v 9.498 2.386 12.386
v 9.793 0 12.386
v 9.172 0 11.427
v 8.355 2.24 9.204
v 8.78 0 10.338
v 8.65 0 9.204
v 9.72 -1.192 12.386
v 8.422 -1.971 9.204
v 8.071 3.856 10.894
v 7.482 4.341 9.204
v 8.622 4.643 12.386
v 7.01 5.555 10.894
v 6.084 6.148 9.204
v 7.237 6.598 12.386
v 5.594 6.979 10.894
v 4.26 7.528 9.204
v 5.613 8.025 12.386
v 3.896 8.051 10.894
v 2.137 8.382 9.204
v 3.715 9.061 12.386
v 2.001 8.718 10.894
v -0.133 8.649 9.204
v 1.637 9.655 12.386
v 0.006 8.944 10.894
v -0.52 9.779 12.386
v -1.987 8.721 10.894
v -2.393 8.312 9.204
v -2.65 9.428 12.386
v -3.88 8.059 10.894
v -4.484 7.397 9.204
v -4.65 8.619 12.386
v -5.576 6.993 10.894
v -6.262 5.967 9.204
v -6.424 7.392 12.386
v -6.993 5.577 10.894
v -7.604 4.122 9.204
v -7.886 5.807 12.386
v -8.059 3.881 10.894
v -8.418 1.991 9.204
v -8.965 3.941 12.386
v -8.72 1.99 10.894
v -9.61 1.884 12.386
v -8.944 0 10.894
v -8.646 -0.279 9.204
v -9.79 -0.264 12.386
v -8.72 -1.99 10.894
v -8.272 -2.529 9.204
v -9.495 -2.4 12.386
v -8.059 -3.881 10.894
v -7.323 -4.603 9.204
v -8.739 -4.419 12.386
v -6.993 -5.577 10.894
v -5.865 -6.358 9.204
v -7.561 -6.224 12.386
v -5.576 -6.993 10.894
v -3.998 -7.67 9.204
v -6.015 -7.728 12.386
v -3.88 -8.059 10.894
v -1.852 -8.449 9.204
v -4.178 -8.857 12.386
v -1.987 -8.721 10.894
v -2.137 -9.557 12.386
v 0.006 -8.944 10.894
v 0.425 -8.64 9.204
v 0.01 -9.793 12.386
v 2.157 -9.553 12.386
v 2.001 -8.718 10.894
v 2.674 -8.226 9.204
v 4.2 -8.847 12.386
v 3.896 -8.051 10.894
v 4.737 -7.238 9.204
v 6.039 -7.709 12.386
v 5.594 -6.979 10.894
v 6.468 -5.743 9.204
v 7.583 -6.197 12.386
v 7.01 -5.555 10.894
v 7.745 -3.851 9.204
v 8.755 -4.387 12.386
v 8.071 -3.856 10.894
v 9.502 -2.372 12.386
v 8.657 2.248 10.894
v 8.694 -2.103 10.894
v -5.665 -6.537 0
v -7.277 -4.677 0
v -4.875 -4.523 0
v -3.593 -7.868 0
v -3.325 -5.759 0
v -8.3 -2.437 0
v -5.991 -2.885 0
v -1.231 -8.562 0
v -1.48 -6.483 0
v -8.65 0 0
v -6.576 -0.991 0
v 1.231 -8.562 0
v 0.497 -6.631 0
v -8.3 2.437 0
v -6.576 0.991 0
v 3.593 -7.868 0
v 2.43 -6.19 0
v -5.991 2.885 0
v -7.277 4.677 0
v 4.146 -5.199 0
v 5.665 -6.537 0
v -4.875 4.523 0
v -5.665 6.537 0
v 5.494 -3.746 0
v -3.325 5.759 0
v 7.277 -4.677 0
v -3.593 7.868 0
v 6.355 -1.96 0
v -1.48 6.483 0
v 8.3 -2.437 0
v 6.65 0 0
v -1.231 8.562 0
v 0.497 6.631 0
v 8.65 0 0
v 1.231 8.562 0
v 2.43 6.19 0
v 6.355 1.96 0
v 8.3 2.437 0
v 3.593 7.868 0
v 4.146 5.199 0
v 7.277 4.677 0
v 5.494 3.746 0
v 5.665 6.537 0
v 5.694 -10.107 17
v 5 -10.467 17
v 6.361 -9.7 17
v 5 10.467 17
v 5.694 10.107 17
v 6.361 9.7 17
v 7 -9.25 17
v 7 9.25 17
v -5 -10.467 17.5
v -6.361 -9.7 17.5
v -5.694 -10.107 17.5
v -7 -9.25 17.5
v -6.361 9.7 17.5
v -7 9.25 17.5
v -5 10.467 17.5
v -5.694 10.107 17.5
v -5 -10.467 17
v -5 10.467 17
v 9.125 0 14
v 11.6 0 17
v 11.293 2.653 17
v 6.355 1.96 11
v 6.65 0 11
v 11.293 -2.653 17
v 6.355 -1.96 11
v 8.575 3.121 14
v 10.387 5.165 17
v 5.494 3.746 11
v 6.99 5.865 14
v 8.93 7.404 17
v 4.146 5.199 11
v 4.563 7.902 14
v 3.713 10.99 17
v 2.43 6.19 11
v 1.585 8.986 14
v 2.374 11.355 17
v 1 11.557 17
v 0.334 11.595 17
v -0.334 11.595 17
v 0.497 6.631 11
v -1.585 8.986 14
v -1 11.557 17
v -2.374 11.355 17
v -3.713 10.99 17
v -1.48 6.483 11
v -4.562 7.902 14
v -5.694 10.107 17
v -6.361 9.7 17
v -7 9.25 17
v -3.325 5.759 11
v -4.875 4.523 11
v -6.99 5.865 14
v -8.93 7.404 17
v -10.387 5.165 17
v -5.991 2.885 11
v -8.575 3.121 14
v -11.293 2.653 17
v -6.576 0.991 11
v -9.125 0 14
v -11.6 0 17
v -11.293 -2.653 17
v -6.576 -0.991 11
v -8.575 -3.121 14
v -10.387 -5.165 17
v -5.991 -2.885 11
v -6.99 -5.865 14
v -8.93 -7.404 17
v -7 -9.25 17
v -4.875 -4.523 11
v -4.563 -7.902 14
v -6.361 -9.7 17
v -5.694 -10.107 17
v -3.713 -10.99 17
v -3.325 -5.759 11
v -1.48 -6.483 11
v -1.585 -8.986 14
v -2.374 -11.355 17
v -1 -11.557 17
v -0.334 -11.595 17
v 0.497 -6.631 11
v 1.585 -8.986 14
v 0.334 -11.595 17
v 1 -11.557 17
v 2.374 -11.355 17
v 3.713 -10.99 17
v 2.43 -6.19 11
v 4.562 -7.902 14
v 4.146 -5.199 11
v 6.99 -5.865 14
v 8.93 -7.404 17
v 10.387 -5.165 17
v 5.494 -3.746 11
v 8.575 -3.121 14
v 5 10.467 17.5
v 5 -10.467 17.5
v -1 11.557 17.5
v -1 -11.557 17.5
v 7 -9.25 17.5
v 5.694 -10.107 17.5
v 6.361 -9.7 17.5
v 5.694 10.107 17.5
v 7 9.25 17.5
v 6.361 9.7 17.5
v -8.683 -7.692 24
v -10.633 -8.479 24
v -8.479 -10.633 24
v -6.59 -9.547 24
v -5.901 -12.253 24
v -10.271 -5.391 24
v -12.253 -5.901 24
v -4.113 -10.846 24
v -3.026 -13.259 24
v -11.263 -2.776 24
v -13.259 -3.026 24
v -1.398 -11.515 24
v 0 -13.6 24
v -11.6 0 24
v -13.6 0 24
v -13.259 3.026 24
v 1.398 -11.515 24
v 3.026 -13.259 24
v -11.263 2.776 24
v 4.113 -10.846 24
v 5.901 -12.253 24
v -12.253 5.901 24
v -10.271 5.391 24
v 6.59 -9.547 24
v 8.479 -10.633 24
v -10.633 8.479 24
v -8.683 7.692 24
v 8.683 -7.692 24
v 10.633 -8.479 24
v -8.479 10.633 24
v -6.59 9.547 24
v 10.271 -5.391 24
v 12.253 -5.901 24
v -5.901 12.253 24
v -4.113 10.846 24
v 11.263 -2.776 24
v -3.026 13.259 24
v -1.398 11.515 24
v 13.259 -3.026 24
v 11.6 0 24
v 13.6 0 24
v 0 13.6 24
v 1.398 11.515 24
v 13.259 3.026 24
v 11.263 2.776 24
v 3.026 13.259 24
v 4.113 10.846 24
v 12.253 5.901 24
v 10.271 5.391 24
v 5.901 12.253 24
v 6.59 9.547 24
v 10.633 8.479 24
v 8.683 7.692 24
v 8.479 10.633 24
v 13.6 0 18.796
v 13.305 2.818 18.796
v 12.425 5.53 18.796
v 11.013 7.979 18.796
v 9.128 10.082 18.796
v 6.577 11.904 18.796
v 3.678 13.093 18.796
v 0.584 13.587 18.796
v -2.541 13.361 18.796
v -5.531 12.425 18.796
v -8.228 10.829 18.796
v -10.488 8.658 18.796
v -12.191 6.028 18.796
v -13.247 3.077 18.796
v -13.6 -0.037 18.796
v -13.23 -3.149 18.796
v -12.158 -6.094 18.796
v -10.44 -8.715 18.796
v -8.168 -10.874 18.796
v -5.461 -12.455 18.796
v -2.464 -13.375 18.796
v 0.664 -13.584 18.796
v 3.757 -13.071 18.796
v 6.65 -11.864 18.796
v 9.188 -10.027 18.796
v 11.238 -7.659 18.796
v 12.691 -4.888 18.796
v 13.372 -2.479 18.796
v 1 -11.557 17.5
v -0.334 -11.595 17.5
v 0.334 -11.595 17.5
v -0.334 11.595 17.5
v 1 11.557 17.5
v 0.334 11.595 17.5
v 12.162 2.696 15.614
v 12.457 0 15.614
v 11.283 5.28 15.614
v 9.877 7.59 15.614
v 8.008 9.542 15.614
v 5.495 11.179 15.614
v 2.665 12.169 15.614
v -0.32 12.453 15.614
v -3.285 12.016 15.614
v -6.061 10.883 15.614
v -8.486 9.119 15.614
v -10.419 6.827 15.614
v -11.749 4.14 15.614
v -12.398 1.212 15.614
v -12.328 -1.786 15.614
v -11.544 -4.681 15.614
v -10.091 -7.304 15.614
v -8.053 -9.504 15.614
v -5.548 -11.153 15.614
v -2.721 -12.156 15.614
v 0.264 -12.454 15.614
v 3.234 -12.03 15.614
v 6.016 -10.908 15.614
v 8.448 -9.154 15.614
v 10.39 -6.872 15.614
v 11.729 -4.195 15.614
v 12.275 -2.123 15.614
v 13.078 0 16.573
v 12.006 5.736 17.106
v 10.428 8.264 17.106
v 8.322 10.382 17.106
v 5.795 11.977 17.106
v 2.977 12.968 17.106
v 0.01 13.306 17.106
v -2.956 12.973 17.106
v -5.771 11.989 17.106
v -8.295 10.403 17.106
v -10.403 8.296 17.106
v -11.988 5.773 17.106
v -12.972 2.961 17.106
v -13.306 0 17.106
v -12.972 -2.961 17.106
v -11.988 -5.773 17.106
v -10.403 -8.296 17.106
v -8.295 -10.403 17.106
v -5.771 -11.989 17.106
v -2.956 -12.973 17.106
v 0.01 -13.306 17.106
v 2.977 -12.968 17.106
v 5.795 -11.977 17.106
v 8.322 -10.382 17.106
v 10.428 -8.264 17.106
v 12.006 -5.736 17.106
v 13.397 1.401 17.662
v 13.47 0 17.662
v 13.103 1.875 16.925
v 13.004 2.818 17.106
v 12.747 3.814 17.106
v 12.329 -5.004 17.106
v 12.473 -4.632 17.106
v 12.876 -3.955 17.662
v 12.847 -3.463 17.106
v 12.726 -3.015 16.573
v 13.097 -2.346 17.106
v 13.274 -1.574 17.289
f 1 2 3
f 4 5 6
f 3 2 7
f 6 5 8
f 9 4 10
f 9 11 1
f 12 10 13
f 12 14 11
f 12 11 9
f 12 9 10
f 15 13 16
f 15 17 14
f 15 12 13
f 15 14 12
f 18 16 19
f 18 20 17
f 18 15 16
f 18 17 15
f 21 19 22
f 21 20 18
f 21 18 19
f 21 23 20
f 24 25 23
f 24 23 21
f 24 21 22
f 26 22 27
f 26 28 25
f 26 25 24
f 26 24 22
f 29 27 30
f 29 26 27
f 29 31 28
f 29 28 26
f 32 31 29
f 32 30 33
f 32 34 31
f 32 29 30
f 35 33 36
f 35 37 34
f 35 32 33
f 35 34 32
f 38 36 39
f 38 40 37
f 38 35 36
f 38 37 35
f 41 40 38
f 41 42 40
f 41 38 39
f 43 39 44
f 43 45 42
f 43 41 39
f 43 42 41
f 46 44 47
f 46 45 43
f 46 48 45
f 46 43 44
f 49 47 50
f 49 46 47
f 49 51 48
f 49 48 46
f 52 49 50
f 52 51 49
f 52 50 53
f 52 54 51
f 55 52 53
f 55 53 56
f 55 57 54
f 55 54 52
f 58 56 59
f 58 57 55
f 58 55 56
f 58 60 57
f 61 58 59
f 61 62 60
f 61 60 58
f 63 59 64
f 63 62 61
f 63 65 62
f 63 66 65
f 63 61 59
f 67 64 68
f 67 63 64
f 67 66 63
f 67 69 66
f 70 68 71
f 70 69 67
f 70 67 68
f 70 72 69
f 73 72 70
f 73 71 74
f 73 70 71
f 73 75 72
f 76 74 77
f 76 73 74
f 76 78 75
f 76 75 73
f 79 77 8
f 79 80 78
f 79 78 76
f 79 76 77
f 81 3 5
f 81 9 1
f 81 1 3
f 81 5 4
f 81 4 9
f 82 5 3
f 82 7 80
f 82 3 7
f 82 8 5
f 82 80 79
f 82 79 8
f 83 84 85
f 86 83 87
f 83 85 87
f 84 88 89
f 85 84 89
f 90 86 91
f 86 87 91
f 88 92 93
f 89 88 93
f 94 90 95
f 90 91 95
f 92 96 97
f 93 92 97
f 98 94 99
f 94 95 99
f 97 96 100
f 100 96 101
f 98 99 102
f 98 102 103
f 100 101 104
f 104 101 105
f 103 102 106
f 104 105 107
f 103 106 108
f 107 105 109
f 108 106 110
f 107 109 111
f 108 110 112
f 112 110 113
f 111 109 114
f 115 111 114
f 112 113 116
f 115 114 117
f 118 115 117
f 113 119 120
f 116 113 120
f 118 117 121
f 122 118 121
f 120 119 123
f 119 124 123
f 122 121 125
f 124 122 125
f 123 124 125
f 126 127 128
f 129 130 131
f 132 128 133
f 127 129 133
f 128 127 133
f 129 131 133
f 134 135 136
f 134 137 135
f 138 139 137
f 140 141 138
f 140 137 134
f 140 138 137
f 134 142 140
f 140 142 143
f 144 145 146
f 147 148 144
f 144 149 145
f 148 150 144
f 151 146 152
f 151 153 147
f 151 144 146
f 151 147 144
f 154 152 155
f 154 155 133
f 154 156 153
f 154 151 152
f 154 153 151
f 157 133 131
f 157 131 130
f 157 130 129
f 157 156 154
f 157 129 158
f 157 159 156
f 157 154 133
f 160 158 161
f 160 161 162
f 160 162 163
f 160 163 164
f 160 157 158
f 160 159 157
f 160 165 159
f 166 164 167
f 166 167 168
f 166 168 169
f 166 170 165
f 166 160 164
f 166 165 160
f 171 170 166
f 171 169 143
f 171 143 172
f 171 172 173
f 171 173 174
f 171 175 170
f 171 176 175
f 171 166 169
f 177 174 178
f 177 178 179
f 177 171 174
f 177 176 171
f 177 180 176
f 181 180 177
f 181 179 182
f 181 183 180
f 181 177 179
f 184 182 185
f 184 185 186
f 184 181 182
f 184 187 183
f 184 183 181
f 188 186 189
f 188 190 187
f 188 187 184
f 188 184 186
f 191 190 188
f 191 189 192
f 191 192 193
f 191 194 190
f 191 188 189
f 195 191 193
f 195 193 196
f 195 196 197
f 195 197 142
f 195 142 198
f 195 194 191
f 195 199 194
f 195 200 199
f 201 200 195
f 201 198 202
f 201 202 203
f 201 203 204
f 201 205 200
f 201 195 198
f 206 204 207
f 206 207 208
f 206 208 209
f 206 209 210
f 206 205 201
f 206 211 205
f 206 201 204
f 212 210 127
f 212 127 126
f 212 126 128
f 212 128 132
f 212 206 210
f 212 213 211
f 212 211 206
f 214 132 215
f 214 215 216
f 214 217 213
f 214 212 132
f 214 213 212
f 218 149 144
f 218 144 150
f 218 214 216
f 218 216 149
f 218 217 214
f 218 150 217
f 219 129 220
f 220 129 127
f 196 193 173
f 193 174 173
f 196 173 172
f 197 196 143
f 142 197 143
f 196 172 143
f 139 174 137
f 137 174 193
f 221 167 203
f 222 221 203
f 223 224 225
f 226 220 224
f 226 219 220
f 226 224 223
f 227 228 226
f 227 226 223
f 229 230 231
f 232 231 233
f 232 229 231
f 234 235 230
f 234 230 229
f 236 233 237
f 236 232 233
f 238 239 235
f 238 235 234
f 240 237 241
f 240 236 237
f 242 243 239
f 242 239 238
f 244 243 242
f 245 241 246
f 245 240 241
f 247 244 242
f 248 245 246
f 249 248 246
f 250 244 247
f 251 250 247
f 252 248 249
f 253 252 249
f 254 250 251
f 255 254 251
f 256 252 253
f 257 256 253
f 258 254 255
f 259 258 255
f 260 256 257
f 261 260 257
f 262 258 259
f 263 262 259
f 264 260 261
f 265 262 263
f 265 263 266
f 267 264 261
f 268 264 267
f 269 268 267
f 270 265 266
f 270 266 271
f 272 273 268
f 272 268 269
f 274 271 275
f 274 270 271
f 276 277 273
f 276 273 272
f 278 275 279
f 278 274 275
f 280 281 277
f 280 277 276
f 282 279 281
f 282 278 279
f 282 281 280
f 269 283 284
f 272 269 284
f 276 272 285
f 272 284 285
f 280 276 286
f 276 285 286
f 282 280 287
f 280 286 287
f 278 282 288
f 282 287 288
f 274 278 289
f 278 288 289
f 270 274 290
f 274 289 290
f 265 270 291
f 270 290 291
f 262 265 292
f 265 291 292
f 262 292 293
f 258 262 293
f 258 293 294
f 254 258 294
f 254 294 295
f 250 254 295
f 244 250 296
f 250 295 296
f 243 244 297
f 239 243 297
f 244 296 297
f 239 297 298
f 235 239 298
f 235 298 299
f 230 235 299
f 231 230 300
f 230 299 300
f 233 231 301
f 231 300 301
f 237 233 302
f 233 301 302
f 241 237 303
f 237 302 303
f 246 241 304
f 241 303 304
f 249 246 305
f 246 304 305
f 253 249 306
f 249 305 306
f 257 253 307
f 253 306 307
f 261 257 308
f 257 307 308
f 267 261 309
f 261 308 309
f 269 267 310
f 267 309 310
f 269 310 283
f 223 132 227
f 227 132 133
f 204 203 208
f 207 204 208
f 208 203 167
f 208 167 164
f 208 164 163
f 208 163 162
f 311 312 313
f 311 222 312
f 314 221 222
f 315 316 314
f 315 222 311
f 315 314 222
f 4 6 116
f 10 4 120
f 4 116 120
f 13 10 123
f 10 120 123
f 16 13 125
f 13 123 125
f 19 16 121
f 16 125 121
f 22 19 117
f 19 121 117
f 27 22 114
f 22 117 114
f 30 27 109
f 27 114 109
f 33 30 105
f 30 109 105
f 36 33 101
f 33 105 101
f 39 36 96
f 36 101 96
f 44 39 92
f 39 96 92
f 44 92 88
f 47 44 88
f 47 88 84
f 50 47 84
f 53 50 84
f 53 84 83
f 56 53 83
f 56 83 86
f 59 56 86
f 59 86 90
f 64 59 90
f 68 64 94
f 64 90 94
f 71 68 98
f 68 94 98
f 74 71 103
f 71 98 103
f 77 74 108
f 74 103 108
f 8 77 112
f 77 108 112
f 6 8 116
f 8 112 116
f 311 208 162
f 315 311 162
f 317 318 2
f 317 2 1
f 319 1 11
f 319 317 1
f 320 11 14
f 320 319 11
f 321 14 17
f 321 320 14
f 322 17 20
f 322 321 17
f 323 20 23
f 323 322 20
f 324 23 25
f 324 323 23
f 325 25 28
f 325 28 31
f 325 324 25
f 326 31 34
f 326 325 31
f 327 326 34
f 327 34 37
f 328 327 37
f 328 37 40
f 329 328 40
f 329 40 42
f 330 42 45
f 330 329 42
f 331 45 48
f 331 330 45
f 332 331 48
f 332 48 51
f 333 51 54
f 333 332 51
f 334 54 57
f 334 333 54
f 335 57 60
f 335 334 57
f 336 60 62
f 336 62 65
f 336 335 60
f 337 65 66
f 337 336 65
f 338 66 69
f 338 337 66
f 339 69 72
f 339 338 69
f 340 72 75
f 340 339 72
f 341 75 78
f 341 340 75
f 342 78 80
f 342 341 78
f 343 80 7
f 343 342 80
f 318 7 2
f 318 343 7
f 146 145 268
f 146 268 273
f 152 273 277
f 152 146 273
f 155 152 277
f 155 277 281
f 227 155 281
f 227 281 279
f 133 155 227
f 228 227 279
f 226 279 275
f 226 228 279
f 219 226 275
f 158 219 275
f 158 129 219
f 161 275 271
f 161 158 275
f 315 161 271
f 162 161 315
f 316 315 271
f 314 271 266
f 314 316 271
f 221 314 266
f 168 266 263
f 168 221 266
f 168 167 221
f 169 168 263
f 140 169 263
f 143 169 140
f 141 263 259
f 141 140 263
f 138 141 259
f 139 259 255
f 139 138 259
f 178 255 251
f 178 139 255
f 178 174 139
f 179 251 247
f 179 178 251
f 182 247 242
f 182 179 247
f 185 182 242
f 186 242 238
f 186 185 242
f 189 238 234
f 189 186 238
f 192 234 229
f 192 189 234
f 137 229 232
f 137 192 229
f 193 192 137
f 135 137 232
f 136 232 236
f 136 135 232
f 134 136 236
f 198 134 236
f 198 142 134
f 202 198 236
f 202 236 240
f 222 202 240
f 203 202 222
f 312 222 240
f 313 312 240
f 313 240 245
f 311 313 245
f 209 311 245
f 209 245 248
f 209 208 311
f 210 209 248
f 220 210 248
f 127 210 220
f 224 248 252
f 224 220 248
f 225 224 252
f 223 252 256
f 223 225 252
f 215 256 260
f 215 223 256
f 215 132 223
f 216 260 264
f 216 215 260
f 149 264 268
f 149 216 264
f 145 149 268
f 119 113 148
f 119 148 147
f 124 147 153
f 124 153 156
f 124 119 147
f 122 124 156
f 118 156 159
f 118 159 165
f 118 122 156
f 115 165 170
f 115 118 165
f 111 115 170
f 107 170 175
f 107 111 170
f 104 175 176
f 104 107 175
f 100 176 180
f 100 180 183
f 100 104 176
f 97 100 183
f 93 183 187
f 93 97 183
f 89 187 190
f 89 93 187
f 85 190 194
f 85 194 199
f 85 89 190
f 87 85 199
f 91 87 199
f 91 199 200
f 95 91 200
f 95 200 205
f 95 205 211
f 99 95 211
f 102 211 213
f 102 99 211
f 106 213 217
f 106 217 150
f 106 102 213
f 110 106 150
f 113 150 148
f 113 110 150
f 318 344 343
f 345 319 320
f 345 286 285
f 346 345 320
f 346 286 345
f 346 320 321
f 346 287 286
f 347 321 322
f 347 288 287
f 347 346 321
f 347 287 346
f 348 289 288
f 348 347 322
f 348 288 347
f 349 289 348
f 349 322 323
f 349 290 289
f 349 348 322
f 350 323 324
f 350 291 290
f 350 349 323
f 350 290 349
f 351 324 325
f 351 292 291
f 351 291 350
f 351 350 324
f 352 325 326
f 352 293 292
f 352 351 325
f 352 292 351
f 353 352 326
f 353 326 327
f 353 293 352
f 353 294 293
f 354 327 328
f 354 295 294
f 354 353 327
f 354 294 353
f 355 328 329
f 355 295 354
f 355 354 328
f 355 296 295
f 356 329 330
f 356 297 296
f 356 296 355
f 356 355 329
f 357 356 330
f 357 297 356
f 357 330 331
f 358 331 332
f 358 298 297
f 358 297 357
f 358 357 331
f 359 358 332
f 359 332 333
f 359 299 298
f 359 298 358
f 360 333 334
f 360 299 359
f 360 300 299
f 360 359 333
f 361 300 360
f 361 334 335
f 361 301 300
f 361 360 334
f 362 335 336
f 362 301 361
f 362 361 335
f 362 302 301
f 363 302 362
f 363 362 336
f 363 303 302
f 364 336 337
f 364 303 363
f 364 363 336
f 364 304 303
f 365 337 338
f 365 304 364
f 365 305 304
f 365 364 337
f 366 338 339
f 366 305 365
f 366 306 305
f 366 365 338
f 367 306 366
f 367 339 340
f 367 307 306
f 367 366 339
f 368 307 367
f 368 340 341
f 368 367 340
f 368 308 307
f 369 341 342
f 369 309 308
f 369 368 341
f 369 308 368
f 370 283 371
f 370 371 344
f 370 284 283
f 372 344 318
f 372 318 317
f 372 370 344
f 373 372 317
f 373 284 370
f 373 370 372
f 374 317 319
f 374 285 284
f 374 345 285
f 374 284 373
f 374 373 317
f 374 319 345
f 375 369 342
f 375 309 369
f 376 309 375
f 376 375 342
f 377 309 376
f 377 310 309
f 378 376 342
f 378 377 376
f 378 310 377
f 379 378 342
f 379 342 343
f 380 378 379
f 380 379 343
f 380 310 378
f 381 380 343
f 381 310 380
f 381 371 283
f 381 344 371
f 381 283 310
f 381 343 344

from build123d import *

# Parameters (mm, degrees)
F0_R     = 8.65
F0_R_2   = 6.65
F1_DEPTH = 11
F3_R     = 13.6
F3_R_2   = 11.6
F4_DEPTH = 7
F8_DEPTH = 0.5
F10_R    = 5


with BuildPart() as f1:
    # F0 (on Top) → F1 (new body)
    with BuildSketch(Plane.XY):
        Circle(F0_R)
        Circle(F0_R_2, mode=Mode.SUBTRACT)
    extrude(amount=F1_DEPTH)


with BuildPart() as f4:
    # F3 (on offset) → F4 (new body)
    with BuildSketch(Plane.XY.offset(17)):
        Circle(F3_R)
        Circle(F3_R_2, mode=Mode.SUBTRACT)
    extrude(amount=F4_DEPTH)


with BuildPart() as f6:
    # F5 (on Front) → F6 (revolve)
    with BuildSketch(Plane.XZ):
        Polygon((11.6, 17), (6.65, 11), (8.65, 11), (13.6, 17), align=None)
    revolve(axis=Axis((0, 0, 14), (0, 0, 1)))


with BuildPart() as f8:
    # F7 (on offset) → F8 (new body)
    with BuildSketch(Plane.XY.offset(17)):
        with BuildLine():
            Line((-5, -11.018621), (-5, 11.018621))
            ThreePointArc((-5, 11.018621), (-6.02744, 10.4919), (-7, 9.86965))
            Line((-7, 9.86965), (-7, -9.86965))
            ThreePointArc((-7, -9.86965), (-6.02744, -10.4919), (-5, -11.018621))
        make_face()
        with BuildLine():
            Line((1, -12.058607), (1, 12.058607))
            ThreePointArc((1, 12.058607), (0.500428, 12.089647), (0, 12.1))
            Line((0, 12.1), (0, 0))
            Line((0, 0), (0, -12.1))
            ThreePointArc((0, -12.1), (0.500428, -12.089647), (1, -12.058607))
        make_face()
        with BuildLine():
            Line((0, 0), (0, 12.1))
            ThreePointArc((0, 12.1), (-0.500428, 12.089647), (-1, 12.058607))
            Line((-1, 12.058607), (-1, -12.058607))
            ThreePointArc((-1, -12.058607), (-0.500428, -12.089647), (0, -12.1))
            Line((0, -12.1), (0, 0))
        make_face()
        with BuildLine():
            Line((7, -9.86965), (7, 9.86965))
            ThreePointArc((7, 9.86965), (6.02744, 10.4919), (5, 11.018621))
            Line((5, 11.018621), (5, -11.018621))
            ThreePointArc((5, -11.018621), (6.02744, -10.4919), (7, -9.86965))
        make_face()
    extrude(amount=F8_DEPTH)


with BuildPart() as f1_1:
    add(f1.part)

    # F9: union F6, F4, F8
    add(f6.part)
    add(f4.part)
    add(f8.part)

    # F10
    f10_edges = [f1_1.edges().sort_by_distance(p)[0] for p in [
        (-8.65, 0, 11),
        (-13.6, 0, 17),
    ]]
    fillet(f10_edges, radius=F10_R)


solid = f1_1.part
